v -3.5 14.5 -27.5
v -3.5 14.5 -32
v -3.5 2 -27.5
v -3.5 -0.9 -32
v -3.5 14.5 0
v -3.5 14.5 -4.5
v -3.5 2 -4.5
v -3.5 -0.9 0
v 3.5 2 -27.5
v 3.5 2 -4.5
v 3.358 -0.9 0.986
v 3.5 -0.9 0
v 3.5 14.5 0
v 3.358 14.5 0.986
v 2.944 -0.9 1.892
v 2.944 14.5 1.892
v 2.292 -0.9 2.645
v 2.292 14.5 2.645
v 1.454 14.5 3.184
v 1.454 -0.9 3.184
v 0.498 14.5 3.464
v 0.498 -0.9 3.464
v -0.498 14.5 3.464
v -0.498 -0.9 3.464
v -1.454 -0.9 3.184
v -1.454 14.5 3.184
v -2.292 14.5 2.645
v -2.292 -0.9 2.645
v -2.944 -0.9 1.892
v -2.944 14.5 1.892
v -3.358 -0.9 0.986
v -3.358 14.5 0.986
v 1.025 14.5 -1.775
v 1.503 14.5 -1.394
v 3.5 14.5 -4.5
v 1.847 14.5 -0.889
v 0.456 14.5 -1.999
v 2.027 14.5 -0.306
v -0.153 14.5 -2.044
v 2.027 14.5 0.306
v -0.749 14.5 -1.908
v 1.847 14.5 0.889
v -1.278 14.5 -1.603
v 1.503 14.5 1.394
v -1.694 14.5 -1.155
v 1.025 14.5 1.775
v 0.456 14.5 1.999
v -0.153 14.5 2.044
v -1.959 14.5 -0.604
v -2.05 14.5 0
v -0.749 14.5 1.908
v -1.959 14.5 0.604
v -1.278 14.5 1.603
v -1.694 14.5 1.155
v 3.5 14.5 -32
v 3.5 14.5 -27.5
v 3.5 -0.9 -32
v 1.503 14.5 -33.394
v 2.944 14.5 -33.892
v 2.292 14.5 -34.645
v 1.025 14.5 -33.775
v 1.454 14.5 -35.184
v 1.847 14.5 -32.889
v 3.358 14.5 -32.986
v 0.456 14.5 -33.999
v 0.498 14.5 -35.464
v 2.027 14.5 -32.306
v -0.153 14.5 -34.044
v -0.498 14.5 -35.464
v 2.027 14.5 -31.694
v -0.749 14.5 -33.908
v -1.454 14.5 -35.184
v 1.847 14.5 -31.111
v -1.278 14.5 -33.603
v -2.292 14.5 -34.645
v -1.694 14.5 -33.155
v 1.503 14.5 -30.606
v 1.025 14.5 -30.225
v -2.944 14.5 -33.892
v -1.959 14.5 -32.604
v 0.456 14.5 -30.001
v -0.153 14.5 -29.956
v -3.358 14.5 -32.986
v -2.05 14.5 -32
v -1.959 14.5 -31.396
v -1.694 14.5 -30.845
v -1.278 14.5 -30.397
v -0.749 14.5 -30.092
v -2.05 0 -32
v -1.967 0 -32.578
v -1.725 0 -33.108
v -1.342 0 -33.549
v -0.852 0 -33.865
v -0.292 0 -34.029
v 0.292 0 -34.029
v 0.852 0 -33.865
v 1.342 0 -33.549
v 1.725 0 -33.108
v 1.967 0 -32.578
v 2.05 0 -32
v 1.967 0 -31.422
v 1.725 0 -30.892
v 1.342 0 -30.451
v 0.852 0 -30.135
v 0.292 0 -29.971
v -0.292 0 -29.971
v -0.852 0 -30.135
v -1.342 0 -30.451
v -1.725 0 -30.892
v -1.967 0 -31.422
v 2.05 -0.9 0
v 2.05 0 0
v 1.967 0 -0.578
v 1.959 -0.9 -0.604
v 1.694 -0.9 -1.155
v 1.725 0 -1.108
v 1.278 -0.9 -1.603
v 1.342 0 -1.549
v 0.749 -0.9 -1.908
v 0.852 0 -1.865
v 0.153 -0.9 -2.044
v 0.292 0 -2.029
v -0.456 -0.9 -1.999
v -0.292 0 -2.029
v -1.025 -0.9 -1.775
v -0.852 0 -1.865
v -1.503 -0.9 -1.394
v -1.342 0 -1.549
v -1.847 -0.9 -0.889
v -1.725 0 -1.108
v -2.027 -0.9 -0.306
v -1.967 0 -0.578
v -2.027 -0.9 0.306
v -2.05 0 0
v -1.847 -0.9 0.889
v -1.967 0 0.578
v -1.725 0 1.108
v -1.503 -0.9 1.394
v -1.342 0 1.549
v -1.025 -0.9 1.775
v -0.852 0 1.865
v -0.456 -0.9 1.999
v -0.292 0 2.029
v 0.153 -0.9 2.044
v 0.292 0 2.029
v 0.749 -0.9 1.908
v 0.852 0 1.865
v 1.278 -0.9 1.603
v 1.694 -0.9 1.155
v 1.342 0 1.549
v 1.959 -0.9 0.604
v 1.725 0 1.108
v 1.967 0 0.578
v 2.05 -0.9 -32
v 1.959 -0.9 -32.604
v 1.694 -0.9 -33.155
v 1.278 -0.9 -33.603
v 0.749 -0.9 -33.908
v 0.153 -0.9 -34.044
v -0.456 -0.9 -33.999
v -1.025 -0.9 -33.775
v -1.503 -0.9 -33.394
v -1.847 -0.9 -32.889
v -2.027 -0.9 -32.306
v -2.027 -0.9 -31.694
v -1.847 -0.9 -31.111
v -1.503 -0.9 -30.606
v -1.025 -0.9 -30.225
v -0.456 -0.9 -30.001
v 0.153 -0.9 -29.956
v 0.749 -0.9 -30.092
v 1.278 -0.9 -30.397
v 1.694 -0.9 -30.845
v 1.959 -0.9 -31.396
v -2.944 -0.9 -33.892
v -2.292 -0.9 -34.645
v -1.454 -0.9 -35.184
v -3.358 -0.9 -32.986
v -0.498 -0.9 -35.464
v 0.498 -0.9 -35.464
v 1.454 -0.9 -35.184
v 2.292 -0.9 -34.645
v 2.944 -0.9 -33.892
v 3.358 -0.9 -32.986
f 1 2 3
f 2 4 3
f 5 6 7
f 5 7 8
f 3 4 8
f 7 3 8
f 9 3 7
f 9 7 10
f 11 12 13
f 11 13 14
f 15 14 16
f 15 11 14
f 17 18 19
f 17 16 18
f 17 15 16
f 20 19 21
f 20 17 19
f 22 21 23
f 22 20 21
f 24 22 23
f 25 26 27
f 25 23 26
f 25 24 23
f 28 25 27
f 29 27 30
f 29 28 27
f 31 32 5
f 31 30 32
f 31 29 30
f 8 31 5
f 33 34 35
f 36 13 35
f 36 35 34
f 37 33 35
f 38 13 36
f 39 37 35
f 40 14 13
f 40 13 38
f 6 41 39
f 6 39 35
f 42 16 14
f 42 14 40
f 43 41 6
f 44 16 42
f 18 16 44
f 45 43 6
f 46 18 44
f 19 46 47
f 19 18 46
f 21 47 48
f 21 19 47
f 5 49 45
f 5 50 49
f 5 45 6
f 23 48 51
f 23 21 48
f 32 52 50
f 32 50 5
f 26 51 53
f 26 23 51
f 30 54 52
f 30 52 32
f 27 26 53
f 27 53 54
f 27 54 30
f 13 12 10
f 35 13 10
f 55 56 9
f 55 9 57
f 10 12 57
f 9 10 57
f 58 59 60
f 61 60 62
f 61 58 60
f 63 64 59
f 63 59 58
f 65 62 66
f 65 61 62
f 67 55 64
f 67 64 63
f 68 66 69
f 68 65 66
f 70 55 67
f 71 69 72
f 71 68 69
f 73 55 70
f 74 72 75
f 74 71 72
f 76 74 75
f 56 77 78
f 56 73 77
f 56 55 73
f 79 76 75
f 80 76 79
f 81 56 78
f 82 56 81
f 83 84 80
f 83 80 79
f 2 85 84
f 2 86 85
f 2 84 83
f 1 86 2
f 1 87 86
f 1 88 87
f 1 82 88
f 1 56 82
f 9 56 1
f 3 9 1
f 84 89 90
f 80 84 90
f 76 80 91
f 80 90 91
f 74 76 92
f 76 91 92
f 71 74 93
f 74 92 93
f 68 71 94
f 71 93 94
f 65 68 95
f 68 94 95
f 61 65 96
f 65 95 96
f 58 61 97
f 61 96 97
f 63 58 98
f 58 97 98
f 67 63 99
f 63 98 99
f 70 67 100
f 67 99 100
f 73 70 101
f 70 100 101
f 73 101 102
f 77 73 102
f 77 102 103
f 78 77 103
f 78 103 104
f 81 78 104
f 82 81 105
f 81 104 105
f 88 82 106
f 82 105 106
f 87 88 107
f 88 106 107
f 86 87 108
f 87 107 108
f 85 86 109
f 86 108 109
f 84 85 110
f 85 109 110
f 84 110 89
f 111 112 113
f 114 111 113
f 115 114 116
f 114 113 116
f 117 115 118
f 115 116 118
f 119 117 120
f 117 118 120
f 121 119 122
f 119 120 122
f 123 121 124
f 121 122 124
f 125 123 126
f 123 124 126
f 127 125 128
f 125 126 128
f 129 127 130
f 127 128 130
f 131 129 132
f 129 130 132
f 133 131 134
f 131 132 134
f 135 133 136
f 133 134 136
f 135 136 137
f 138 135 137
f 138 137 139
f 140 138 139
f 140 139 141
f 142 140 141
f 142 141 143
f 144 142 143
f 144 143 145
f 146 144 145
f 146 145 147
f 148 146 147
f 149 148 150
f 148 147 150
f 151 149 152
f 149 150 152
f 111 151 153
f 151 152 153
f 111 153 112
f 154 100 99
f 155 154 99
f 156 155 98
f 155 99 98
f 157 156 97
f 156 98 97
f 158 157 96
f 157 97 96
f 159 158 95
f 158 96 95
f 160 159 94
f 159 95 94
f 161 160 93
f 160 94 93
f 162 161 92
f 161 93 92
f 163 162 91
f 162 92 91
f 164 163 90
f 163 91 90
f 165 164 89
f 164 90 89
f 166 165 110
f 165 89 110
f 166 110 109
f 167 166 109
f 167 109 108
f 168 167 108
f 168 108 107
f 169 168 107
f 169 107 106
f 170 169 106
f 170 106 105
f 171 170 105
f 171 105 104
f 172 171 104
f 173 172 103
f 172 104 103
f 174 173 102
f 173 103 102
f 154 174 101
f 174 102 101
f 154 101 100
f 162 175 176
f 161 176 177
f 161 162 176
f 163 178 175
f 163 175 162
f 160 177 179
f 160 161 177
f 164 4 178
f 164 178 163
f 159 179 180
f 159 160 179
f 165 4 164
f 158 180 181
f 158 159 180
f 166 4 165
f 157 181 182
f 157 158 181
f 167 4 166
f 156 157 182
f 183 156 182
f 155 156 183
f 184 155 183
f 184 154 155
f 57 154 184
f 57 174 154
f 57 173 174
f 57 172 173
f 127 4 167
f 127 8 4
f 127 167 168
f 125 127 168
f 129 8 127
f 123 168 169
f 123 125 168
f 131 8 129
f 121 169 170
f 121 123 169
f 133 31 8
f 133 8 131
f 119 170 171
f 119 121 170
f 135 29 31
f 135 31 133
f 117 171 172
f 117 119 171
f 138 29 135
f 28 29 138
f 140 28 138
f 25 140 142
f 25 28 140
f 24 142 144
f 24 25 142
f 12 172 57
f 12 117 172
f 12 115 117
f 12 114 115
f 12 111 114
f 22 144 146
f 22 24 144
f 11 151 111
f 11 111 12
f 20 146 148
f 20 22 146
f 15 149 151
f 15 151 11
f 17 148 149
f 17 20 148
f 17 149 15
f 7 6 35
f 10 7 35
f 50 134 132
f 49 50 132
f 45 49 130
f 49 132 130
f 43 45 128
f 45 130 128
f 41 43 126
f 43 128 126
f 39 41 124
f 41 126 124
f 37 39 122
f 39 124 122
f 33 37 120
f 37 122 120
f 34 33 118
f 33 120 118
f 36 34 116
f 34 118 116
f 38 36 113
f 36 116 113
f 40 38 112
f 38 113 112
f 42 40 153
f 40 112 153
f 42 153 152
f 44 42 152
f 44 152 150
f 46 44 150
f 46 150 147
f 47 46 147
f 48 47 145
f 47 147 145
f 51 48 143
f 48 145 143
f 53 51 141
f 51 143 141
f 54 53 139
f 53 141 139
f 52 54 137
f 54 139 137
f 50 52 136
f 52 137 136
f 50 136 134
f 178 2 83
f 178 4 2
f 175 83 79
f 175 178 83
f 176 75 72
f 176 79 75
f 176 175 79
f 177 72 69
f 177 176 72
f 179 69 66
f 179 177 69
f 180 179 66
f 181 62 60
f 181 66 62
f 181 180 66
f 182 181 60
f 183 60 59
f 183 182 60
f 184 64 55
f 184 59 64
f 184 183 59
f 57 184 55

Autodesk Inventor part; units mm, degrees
ref_plane "YZ Plane" through (0, 0, 0) normal (1, 0, 0) x (0, 1, 0)
ref_plane "XZ Plane" through (0, 0, 0) normal (0, 1, 0) x (-1, 0, 0)
ref_plane "XY Plane" through (0, 0, 0) normal (0, 0, 1) x (1, 0, 0)
sketch "Sketch1" plane through (0, 0, 0) normal (0, 1, 0) x (-1, 0, 0)
  line L0 (0, 0) -> (0, -32) construction
  line L1 (-3.5, 0) -> (-3.5, -32)
  line L2 (3.5, -32) -> (3.5, 0)
  arc A0 (3.5, 0) -> (-3.5, 0) centre (0, 0) ccw
  arc A1 (-3.5, -32) -> (3.5, -32) centre (0, -32) ccw
  circle A2 centre (0, 0) radius 2.05
  circle A3 centre (0, -32) radius 2.05
  circle A4 centre (0, 0) radius 3.5 construction
  line L3 (-3.5, -4.5) -> (3.5, -4.5)
  line L4 (3.5, -4.5) -> (3.5, -27.5)
  line L5 (3.5, -27.5) -> (-3.5, -27.5)
  line L6 (-3.5, -27.5) -> (-3.5, -4.5)
  line L7 (3.5, -3) -> (-3.5, -3)
  line L8 (3.5, -29) -> (-3.5, -29)
  point P0 (0, -16)
  point P1 (3.5, -16)
  dimension "d0" = 32
  dimension "d1" = 7
  dimension "d2" = 4.1
  dimension "d3" = 4.1
  dimension "d4" = 7
  dimension "d5" = 7
  dimension "d6" = 23
  dimension "d7" = 1.5
  dimension "d8" = 1.5
extrude "Extrusion1" add sketch "Sketch1" along normal blind 14.5
sketch "Sketch3" plane through (0, 14.5, 0) normal (0, 1, 0) x (1, 0, 0)
  line L0 (-3.5, 32) -> (-3.5, 0) projected
  line L1 (-3.5, 4.5) -> (3.5, 4.5)
  line L2 (3.5, 4.5) -> (3.5, 27.5)
  line L3 (3.5, 27.5) -> (-3.5, 27.5)
  line L4 (-3.5, 27.5) -> (-3.5, 4.5)
  point P0 (0, 0)
  point P1 (-3.5, 16)
  dimension "d15" = 7
  dimension "d16" = 23
extrude "Extrusion2" cut sketch "Sketch3" against normal blind 12.5
sketch "Sketch5" plane through (0, 0, 0) normal (0, -1, 0) x (1, 0, 0)
  line L0 (0, 0) -> (0, -32) construction
  line L1 (-3.5, 0) -> (-3.5, -32)
  line L2 (3.5, -32) -> (3.5, 0)
  arc A0 (3.5, 0) -> (-3.5, 0) centre (0, 0) ccw
  arc A1 (-3.5, -32) -> (3.5, -32) centre (0, -32) ccw
  circle A2 centre (0, 0) radius 2.05
  circle A3 centre (0, -32) radius 2.05
  circle A4 centre (0, 0) radius 3.5 construction
  line L3 (-3.5, -4.5) -> (3.5, -4.5)
  line L4 (3.5, -4.5) -> (3.5, -27.5)
  line L5 (3.5, -27.5) -> (-3.5, -27.5)
  line L6 (-3.5, -27.5) -> (-3.5, -4.5)
  line L7 (3.5, -3) -> (-3.5, -3)
  line L8 (3.5, -29) -> (-3.5, -29)
  point P0 (0, -16)
  point P1 (3.5, -16)
  dimension "d22" = 32
  dimension "d23" = 7
  dimension "d24" = 4.1
  dimension "d25" = 4.1
  dimension "d26" = 7
  dimension "d27" = 7
  dimension "d28" = 23
  dimension "d29" = 1.5
  dimension "d30" = 1.5
extrude "Extrusion3" add sketch "Sketch5" along normal blind 0.9
properties part number "Micro_servo_frame_2"
